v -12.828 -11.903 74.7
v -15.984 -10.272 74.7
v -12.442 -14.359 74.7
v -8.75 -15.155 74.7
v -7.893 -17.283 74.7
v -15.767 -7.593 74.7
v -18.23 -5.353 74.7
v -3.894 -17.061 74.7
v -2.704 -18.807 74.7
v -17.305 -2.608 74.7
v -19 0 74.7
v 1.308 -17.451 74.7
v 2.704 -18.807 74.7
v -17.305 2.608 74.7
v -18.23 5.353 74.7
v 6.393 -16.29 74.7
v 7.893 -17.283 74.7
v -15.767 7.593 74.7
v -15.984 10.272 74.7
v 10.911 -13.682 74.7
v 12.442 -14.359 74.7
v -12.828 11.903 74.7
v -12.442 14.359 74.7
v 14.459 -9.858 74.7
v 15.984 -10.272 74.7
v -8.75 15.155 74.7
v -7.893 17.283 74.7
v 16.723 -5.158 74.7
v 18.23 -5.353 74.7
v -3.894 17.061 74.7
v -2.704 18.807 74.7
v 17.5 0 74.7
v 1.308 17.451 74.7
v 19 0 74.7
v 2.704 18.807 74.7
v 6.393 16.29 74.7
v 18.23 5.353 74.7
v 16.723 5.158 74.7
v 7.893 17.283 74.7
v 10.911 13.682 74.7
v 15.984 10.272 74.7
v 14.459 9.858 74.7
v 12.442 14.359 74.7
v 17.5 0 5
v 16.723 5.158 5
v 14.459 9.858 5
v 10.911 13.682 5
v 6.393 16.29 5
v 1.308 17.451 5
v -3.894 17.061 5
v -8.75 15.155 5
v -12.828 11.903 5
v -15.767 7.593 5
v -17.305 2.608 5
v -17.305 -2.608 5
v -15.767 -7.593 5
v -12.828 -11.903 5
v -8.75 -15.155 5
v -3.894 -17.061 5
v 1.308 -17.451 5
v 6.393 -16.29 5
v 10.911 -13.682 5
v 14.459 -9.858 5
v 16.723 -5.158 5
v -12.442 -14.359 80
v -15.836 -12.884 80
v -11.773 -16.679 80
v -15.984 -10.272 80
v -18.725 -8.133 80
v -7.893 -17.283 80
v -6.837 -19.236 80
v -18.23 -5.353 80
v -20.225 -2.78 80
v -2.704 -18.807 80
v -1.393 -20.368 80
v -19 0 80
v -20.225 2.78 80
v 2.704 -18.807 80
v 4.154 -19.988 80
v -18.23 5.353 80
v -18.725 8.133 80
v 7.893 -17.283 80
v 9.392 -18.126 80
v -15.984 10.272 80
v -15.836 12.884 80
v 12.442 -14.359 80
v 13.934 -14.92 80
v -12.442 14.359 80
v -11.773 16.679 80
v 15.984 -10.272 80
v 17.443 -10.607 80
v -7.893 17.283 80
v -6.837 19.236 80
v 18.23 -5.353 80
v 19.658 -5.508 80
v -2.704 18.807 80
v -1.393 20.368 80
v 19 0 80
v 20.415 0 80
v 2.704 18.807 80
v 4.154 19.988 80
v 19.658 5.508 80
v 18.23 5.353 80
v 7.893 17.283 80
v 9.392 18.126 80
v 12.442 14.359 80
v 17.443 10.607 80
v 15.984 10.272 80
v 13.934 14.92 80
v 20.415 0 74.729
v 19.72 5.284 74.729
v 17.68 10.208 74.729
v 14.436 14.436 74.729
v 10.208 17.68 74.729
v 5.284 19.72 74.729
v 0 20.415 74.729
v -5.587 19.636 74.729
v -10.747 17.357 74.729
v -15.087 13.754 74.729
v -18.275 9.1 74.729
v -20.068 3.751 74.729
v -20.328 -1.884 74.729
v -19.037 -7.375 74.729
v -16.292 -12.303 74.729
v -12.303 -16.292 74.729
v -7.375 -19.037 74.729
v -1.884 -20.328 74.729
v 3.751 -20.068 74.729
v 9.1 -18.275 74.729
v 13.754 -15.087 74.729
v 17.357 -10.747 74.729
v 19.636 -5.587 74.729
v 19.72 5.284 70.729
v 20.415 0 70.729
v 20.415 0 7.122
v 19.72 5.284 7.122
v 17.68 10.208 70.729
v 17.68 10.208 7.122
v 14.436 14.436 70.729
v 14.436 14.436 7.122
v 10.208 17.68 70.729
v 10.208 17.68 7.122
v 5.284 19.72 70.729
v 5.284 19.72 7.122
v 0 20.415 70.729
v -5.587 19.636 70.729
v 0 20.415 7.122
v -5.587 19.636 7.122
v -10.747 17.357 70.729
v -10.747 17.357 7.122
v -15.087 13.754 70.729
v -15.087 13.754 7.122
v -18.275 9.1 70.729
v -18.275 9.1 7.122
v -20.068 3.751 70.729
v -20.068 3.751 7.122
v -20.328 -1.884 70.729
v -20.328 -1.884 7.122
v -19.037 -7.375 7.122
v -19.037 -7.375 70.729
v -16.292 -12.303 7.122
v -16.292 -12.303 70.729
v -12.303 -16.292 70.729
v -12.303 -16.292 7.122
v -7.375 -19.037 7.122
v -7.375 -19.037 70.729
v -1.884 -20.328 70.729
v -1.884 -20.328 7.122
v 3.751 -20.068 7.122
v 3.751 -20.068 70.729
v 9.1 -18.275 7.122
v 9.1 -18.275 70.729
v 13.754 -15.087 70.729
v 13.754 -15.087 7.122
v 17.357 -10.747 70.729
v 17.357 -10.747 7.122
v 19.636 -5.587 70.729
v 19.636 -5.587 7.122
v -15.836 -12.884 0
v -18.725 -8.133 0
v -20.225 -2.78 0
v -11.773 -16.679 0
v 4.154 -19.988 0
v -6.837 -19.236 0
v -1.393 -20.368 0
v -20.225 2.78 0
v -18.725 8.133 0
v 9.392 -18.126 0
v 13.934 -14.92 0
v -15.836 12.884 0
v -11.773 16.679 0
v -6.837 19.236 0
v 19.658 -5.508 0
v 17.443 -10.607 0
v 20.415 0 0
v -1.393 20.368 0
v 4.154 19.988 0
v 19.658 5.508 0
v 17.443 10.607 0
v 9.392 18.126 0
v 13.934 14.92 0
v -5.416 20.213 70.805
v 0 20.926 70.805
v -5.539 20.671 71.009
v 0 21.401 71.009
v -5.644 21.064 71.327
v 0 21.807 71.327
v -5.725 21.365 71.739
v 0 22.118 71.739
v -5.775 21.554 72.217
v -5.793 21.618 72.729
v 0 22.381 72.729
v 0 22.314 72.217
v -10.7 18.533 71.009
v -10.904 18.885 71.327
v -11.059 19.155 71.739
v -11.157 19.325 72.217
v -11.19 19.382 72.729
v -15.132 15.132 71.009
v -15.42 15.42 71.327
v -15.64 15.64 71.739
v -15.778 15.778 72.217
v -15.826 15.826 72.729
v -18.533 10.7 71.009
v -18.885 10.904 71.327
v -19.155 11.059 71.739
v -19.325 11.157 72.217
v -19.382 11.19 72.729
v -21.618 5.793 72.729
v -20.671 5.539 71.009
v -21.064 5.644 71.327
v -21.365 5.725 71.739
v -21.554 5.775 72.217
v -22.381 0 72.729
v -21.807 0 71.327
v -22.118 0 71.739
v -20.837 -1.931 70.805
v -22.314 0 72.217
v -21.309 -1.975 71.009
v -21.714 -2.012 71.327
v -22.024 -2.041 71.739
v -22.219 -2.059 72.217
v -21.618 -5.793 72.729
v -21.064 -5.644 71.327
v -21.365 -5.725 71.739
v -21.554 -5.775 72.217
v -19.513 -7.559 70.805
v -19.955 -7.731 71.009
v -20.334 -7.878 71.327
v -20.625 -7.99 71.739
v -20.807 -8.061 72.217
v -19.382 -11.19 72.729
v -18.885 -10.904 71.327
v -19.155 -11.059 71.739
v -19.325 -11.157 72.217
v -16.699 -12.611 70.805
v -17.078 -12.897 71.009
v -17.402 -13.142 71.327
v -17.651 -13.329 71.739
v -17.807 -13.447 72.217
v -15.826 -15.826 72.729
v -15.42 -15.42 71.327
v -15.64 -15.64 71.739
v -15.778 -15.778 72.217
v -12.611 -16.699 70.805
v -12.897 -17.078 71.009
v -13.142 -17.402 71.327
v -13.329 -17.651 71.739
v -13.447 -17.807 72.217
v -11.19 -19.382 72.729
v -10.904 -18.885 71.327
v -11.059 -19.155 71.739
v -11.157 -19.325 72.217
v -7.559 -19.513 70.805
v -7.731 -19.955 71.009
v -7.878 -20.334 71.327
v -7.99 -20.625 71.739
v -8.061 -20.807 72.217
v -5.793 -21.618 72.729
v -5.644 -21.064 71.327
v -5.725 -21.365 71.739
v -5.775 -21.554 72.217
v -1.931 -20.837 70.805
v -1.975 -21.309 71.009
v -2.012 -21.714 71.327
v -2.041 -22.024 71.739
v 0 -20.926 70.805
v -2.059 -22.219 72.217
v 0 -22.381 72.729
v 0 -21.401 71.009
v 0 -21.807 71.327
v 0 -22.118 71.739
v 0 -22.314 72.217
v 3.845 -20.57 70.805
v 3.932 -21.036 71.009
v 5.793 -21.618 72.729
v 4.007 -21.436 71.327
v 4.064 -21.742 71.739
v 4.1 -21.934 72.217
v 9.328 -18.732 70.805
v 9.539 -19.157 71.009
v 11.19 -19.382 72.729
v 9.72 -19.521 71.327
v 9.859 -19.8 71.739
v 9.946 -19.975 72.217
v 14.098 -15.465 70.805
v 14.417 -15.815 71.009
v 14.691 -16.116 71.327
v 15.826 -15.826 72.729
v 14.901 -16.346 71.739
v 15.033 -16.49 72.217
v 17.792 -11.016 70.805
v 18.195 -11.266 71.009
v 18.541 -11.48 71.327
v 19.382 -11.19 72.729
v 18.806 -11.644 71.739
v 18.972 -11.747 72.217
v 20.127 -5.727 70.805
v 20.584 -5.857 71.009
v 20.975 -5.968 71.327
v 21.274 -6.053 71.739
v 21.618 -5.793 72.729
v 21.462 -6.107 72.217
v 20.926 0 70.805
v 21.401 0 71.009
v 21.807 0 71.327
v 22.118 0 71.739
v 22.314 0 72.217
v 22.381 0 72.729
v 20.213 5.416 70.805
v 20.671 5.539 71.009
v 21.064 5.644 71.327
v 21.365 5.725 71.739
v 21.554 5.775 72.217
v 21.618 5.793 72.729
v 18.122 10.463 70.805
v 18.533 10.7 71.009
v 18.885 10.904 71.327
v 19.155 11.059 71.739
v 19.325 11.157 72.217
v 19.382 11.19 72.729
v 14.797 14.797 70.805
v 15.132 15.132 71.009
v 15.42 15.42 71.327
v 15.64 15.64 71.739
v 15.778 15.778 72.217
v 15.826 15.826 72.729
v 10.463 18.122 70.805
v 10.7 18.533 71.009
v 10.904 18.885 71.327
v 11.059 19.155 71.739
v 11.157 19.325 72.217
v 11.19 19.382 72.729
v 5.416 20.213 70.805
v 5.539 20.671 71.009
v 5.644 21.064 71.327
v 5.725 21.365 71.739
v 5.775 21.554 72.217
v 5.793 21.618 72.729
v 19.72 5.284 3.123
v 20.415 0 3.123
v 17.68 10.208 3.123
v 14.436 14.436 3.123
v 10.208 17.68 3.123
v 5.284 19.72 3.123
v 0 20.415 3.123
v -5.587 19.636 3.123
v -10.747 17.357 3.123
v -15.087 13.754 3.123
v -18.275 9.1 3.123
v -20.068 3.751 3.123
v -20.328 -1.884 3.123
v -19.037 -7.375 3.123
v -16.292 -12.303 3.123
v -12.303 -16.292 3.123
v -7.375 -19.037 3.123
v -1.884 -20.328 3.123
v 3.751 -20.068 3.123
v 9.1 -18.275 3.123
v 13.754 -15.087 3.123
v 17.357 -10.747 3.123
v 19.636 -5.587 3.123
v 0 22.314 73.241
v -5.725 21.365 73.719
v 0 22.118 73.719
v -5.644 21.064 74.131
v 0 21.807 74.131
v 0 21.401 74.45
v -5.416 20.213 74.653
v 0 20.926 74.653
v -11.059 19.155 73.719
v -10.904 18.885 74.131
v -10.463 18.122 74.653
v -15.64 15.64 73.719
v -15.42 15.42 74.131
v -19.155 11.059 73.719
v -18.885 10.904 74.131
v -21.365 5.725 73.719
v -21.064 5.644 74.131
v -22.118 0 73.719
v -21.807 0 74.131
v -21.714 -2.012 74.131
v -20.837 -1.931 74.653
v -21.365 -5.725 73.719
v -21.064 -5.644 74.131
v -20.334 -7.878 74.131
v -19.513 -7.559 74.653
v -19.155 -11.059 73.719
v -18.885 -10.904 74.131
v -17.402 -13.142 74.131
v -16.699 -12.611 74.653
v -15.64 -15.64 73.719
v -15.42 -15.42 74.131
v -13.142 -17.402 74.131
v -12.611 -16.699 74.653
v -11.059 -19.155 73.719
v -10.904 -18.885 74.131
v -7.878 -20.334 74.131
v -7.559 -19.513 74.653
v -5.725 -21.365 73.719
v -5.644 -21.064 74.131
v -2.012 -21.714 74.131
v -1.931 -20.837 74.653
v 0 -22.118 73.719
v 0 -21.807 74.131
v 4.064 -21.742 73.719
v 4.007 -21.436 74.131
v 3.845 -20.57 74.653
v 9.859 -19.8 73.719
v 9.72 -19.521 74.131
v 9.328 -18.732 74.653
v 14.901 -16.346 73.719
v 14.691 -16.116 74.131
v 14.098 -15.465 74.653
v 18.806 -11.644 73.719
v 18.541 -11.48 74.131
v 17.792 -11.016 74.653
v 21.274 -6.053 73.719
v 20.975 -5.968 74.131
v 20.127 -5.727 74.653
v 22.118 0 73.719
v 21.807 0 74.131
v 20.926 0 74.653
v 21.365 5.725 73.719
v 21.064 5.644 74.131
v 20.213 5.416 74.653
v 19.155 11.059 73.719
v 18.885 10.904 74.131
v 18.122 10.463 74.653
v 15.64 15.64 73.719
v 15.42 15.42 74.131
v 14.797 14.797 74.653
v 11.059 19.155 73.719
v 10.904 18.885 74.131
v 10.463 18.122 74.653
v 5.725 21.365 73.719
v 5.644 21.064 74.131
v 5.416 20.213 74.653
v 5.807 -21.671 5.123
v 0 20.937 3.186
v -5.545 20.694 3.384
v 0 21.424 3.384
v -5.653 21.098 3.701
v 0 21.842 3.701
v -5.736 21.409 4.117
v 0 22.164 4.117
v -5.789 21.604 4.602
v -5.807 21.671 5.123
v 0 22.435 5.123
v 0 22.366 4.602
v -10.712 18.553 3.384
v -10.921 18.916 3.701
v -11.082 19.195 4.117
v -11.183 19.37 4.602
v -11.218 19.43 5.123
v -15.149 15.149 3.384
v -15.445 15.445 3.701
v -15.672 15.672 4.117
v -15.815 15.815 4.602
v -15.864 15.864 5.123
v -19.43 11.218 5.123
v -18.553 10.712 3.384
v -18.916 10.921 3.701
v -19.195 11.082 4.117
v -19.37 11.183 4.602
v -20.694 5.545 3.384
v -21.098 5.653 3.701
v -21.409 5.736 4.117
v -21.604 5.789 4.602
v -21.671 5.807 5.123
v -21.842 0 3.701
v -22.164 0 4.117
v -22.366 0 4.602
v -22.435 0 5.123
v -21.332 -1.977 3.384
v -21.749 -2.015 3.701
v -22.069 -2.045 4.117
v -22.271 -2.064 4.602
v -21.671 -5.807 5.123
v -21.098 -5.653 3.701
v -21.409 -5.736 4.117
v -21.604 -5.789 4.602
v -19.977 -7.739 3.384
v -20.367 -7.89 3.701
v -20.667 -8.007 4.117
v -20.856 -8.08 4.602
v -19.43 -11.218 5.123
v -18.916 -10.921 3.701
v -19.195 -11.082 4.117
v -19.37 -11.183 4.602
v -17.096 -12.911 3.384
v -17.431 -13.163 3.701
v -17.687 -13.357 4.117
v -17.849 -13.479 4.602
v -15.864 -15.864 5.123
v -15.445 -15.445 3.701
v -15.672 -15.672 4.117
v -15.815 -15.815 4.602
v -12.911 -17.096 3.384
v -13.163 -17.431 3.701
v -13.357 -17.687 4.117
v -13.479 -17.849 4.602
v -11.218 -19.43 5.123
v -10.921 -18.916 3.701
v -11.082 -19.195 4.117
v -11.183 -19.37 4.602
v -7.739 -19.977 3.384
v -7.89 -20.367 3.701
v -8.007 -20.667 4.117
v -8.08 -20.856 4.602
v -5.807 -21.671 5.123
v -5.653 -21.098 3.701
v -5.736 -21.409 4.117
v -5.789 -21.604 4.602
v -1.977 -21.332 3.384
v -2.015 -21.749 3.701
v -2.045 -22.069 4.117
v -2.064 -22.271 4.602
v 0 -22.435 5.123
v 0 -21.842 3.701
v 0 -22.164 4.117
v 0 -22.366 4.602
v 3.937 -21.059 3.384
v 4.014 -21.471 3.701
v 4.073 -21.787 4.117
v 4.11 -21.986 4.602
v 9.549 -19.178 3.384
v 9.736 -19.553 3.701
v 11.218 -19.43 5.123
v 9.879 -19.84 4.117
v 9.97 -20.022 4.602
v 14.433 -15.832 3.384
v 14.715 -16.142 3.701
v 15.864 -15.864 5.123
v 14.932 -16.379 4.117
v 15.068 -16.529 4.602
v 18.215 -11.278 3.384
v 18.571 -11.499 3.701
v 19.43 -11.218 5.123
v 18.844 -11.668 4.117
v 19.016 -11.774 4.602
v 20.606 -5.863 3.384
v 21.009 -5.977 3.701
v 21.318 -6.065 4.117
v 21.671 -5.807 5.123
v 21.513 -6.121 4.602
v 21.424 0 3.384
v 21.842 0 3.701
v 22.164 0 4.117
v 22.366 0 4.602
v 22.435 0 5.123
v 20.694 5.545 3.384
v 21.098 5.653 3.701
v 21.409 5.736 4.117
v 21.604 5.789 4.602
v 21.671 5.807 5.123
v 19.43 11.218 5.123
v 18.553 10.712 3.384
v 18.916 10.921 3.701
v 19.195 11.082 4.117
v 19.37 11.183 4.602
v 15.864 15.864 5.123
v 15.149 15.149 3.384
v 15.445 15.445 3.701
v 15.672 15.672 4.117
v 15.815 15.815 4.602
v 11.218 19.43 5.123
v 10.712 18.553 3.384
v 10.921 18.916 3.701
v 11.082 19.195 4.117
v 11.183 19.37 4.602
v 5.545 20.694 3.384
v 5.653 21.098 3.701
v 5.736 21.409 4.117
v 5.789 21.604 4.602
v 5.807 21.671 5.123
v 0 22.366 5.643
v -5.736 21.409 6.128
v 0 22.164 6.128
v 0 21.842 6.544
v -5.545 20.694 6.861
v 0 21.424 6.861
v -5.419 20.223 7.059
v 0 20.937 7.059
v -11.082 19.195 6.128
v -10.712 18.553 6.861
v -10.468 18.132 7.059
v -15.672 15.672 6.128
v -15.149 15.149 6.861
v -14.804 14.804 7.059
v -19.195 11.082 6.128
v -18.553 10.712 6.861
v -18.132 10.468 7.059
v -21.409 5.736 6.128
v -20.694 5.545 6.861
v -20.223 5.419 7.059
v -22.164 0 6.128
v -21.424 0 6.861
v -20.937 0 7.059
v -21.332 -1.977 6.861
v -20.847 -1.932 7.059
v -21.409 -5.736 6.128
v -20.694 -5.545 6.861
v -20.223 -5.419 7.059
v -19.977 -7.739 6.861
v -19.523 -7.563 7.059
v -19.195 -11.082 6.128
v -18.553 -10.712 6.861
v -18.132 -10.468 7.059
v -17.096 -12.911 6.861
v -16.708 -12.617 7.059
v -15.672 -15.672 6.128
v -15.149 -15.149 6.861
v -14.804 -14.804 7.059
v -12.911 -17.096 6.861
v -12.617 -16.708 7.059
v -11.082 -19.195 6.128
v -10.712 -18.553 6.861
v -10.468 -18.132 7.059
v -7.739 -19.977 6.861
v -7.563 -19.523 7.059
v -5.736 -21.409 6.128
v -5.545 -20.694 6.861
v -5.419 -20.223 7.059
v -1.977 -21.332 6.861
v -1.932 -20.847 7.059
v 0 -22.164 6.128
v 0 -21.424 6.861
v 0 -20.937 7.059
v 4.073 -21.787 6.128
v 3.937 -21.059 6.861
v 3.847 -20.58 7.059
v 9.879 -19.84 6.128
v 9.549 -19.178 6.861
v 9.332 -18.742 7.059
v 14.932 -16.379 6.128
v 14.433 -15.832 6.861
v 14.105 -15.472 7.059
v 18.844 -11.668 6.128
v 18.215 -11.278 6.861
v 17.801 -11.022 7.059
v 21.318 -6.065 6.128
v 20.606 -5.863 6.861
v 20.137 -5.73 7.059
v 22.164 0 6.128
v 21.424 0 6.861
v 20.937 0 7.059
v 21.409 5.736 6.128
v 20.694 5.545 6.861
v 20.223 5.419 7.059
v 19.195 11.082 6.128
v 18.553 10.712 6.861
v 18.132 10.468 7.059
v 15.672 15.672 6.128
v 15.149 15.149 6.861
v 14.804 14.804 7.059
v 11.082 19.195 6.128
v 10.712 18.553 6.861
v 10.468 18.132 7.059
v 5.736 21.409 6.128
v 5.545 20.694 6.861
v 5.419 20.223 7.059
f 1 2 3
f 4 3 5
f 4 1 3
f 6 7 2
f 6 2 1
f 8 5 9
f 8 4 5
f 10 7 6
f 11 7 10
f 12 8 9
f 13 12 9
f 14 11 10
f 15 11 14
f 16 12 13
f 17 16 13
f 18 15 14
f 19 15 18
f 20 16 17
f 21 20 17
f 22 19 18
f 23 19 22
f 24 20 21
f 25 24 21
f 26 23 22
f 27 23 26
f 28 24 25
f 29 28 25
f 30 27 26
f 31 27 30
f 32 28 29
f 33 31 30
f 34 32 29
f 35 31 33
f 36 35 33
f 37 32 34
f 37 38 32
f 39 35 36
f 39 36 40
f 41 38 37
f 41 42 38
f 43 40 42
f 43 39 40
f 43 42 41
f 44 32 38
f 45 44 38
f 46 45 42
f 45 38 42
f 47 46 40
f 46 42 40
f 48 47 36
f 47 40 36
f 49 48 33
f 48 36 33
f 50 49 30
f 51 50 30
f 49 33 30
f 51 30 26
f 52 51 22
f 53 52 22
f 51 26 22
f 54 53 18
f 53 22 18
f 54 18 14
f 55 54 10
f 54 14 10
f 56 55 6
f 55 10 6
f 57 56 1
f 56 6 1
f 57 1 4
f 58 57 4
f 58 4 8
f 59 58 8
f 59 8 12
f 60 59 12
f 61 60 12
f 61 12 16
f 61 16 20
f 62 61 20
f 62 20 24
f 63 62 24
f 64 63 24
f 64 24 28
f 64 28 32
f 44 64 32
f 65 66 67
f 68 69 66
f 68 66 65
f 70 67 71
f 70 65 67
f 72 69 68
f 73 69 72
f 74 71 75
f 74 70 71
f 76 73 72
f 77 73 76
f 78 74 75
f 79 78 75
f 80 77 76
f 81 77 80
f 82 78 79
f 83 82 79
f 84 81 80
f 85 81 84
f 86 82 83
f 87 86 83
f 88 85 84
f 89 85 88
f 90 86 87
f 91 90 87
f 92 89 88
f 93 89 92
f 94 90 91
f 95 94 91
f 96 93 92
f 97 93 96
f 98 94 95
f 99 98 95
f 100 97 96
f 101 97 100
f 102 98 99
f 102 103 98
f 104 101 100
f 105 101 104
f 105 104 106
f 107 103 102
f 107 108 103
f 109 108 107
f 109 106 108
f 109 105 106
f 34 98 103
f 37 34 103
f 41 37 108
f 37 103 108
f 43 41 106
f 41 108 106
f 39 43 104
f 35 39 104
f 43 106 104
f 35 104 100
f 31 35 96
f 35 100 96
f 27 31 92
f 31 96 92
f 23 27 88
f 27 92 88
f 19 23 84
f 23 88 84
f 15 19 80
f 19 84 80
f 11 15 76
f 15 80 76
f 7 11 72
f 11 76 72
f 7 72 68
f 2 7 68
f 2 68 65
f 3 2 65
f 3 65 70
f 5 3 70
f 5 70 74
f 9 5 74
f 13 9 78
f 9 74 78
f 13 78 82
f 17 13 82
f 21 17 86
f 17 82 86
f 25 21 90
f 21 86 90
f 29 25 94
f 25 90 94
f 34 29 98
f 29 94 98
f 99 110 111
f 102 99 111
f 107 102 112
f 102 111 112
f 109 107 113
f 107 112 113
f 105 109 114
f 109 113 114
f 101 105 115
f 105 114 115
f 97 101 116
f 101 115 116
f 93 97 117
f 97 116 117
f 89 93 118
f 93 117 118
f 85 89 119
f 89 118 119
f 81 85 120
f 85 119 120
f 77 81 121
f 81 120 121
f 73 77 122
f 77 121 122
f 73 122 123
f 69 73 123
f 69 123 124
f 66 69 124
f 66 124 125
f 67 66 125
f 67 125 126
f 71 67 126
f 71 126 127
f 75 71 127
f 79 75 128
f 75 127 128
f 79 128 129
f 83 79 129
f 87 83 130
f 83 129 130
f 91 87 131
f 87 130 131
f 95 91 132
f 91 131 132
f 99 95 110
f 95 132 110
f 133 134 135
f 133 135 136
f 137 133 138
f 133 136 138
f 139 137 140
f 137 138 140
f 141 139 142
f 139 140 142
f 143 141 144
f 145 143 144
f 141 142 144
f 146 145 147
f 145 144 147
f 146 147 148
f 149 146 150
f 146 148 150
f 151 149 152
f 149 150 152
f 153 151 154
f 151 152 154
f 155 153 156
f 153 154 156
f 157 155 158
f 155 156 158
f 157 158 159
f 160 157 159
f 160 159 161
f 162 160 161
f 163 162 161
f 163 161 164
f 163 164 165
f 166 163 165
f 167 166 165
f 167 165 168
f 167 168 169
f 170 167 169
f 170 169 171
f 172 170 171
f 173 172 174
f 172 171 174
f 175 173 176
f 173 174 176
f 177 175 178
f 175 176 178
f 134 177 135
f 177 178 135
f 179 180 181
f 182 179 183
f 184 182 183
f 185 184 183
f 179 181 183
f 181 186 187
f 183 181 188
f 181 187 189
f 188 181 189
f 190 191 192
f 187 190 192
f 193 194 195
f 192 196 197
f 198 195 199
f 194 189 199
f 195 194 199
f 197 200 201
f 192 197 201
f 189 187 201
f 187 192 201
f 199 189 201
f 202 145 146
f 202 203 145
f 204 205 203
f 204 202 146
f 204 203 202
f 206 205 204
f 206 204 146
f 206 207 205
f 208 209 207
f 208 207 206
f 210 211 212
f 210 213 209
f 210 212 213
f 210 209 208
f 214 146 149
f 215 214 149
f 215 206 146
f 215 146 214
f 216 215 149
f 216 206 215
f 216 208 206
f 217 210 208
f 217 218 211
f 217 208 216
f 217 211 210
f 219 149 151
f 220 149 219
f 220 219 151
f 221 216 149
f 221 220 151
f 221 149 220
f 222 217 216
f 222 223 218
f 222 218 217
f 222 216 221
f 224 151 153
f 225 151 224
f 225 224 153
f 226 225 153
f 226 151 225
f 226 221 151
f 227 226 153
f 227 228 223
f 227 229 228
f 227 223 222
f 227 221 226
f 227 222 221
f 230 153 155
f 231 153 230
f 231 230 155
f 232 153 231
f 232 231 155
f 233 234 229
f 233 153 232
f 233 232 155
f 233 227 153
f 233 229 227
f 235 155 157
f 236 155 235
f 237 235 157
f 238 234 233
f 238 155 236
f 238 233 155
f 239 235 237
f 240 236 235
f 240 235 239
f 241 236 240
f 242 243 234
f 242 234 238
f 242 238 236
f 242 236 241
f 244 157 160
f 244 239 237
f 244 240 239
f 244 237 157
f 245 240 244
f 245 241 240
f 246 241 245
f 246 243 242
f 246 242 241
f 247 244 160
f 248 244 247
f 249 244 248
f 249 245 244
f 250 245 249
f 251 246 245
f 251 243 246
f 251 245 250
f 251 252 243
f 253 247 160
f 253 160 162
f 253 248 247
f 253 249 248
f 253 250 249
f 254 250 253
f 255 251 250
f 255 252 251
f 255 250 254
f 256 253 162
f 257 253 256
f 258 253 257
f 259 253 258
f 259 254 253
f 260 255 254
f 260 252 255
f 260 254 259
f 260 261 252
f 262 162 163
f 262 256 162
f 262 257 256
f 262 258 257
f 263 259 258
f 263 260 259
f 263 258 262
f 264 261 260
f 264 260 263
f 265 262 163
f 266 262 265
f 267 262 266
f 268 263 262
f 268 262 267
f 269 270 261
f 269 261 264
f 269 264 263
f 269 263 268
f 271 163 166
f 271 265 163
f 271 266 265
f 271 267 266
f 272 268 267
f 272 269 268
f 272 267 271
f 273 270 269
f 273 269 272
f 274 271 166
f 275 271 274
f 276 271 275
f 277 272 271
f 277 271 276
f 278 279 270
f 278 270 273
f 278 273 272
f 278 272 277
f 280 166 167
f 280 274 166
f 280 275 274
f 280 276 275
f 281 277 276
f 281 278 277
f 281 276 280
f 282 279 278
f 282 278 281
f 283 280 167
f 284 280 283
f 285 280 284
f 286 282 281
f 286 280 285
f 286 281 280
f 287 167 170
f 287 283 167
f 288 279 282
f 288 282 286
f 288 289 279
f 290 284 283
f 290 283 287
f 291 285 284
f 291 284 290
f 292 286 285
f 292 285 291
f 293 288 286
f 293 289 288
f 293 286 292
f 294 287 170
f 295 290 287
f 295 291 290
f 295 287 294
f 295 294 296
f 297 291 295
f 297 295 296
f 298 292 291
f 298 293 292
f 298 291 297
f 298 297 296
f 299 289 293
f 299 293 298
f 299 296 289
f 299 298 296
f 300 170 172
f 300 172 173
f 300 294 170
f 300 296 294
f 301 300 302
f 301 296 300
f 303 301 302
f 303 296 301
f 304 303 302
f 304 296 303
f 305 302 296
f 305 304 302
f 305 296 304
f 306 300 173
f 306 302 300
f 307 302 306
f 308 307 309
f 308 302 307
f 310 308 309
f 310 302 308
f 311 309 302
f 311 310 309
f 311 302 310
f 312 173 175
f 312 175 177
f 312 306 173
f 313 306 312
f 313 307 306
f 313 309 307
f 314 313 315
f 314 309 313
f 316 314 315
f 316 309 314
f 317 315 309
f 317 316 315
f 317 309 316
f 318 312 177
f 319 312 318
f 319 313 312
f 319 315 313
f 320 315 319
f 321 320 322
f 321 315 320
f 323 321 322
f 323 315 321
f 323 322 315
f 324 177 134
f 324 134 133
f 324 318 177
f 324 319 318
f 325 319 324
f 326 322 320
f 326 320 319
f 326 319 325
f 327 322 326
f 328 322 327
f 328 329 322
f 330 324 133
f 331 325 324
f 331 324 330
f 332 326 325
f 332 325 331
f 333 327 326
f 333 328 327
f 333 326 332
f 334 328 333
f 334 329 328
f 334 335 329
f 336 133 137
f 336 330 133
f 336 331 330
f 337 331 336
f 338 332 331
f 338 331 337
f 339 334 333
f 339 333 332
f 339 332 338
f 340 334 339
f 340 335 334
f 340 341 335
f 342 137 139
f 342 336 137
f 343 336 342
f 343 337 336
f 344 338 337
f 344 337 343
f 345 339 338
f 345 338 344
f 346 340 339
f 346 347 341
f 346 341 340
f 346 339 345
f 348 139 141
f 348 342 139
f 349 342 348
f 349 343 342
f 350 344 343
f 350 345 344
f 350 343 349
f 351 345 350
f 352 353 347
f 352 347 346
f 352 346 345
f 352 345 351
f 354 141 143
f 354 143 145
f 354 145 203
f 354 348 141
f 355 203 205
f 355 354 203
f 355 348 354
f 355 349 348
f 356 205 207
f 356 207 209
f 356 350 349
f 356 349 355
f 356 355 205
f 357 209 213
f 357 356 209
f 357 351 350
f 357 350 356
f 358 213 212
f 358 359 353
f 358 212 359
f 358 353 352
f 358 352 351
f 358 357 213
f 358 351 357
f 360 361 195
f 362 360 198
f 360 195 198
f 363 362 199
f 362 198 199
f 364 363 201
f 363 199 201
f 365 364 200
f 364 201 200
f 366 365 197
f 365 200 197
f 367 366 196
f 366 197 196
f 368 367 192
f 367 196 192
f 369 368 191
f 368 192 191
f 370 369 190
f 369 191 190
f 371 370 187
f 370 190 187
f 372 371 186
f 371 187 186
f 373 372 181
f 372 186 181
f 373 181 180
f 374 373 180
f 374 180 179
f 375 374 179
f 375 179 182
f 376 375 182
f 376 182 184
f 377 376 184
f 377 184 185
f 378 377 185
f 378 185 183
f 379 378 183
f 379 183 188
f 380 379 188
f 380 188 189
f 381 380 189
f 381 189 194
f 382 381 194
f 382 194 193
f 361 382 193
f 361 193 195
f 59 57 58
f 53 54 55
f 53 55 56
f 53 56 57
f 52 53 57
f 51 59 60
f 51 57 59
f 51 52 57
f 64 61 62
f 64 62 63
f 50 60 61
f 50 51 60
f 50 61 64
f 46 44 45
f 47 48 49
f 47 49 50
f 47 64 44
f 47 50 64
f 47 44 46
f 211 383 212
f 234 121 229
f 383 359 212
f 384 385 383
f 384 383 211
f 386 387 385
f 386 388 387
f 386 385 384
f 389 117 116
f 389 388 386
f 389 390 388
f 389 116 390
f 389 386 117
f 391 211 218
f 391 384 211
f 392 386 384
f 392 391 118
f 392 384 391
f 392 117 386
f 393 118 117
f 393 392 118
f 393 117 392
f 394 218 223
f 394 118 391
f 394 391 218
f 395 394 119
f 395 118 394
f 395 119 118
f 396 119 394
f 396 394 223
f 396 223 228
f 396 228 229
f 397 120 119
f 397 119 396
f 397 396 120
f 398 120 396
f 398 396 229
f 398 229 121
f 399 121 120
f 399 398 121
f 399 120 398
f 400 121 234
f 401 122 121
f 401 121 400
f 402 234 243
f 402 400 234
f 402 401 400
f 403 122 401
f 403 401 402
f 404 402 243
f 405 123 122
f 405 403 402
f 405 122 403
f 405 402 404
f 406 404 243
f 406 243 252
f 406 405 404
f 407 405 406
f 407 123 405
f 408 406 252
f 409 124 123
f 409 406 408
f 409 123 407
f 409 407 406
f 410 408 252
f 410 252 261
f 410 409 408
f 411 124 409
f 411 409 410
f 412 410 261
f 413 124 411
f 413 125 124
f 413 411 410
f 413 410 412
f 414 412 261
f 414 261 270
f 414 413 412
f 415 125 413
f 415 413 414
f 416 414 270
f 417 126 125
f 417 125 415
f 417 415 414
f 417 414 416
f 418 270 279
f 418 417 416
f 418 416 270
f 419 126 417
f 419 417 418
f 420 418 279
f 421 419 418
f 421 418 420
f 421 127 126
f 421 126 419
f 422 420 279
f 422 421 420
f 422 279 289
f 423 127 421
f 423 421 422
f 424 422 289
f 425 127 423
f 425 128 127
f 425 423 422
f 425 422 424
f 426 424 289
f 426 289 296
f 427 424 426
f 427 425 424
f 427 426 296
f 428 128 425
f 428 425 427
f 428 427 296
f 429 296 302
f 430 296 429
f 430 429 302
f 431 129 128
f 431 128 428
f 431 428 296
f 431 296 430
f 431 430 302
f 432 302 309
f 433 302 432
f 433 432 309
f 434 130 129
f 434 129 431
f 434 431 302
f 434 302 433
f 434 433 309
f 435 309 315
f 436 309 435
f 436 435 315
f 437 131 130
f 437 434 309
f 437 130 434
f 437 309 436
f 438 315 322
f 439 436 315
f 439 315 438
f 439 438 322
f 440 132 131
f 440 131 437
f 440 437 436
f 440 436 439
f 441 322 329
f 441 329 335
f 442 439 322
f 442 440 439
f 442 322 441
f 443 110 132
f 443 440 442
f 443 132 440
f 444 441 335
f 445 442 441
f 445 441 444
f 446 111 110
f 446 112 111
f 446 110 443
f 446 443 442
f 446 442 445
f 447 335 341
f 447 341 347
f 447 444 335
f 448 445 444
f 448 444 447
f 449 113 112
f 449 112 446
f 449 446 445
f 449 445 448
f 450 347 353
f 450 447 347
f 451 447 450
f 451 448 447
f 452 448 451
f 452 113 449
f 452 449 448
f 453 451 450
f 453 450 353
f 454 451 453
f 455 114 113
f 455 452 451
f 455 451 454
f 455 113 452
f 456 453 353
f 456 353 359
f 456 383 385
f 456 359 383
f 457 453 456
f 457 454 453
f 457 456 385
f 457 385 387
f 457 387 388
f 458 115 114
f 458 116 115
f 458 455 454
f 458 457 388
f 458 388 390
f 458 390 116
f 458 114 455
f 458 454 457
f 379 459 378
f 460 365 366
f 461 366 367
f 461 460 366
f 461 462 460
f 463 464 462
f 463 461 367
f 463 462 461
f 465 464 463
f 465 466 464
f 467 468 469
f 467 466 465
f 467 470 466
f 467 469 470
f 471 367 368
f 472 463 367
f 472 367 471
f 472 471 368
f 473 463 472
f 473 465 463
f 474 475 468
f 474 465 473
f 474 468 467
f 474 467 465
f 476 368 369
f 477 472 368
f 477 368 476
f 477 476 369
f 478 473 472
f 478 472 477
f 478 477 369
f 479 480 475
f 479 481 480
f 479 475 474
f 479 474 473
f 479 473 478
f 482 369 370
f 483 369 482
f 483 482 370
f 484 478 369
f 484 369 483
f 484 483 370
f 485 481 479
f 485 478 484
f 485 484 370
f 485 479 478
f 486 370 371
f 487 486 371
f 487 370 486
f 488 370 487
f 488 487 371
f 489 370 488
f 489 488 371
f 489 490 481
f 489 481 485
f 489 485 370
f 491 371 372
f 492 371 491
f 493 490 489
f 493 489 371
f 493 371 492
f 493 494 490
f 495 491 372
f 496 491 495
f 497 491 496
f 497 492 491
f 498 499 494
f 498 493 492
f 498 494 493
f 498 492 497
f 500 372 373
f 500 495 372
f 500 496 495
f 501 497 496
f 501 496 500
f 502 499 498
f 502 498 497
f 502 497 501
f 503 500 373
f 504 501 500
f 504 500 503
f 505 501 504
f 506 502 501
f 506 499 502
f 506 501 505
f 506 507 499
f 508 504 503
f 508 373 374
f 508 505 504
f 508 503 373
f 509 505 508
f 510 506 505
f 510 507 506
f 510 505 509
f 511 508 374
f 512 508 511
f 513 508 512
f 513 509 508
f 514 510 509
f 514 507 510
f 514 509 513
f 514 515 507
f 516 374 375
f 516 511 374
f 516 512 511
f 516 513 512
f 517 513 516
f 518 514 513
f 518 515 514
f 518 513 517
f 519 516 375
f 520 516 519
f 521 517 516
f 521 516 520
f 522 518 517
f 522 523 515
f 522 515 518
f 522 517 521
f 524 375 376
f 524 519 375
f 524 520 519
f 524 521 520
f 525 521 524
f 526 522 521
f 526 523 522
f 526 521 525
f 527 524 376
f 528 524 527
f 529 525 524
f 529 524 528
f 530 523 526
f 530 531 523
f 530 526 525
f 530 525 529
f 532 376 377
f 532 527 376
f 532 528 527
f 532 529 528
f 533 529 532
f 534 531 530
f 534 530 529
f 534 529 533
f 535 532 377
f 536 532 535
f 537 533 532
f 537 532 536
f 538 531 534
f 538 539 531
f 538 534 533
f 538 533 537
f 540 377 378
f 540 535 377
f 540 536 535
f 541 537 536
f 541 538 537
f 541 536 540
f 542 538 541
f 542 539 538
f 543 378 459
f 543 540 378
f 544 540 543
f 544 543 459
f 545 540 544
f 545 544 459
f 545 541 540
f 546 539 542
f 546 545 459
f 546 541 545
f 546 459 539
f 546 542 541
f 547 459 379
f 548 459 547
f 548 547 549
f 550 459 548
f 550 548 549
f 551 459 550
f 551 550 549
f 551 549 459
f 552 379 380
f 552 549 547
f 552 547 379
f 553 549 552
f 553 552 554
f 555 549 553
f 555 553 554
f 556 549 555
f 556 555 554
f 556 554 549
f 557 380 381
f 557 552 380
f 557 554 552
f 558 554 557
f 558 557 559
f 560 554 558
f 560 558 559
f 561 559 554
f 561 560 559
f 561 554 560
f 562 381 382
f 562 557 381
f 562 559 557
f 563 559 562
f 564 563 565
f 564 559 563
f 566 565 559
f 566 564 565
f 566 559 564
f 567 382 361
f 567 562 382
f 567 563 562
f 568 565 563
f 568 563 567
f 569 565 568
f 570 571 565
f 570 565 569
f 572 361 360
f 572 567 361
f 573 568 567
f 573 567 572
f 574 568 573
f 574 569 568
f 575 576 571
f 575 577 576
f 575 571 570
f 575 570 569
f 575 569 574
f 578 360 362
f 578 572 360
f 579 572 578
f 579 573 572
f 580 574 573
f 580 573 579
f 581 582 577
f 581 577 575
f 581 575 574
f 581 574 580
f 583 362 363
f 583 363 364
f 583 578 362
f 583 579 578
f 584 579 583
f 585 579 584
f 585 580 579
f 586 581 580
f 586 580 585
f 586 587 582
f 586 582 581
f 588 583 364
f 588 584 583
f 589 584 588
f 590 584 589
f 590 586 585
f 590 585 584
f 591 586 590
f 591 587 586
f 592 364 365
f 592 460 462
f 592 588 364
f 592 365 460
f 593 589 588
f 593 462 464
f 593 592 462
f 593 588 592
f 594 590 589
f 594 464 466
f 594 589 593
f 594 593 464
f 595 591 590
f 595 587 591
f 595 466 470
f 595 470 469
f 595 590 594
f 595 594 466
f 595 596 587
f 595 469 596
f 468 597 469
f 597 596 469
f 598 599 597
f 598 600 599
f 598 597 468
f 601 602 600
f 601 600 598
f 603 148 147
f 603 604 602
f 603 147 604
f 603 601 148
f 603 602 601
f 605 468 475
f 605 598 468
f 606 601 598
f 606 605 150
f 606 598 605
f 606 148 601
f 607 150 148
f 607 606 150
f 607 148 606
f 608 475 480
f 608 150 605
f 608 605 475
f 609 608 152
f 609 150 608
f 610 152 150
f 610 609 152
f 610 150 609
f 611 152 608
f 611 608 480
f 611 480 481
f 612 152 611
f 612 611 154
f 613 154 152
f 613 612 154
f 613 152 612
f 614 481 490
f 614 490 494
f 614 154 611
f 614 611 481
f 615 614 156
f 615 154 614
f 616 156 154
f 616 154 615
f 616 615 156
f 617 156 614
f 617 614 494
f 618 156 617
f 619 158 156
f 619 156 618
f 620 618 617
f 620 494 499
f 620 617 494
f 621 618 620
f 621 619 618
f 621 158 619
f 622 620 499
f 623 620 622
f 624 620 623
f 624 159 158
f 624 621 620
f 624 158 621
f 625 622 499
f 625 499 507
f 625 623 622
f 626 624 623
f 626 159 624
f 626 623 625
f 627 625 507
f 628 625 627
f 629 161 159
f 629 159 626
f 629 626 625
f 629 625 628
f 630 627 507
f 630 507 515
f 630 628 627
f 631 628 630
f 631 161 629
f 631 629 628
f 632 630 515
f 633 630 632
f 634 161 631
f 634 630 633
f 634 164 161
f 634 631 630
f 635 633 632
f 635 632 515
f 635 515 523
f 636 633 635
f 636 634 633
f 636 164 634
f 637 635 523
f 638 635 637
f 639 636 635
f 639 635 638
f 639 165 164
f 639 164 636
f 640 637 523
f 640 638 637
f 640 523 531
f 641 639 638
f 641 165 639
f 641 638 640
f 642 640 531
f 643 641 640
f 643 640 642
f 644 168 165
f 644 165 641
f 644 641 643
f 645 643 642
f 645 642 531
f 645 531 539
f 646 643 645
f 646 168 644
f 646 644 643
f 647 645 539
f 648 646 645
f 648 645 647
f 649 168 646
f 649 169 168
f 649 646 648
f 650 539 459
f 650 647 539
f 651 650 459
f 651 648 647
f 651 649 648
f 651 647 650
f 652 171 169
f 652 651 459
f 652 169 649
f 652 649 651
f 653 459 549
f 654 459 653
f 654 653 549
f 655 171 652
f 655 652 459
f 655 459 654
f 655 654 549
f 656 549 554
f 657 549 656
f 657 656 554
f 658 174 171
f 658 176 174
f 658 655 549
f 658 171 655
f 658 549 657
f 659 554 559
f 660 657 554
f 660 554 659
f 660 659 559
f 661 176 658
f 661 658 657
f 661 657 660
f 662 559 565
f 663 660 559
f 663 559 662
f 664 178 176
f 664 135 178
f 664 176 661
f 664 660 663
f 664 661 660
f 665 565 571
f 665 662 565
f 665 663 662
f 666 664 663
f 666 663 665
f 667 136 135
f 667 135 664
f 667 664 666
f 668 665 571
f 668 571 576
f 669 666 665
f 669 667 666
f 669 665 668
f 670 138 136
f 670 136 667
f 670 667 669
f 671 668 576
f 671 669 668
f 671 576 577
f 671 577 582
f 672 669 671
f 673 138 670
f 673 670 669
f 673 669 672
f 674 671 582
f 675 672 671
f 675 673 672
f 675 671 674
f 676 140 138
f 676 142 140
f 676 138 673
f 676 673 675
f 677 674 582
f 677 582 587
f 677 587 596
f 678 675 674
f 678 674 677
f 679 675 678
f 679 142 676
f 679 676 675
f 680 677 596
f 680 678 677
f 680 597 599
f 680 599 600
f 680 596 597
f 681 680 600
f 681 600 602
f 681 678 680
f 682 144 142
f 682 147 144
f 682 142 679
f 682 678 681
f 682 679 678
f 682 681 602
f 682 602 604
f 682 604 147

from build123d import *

# Parameters (mm, degrees)
F0_R     = 20.415147
F1_DEPTH = 80
F2_R     = 17.5
F3_DEPTH = 75
F4_R     = 19
F5_DEPTH = 5.3
F6_R     = 2


with BuildPart() as f1:
    # F0 (on Top) → F1 (new body)
    with BuildSketch(Plane.XY):
        Circle(F0_R)
    extrude(amount=F1_DEPTH)

    # F2 (on face) → F3 (cut)
    with BuildSketch(Plane.XY.offset(80)):
        Circle(F2_R)
    extrude(amount=-F3_DEPTH, mode=Mode.SUBTRACT)

    # F4 (on face) → F5 (cut)
    with BuildSketch(Plane.XY.offset(80)):
        Circle(F4_R)
    extrude(amount=-F5_DEPTH, mode=Mode.SUBTRACT)

    # F6 (on Right) → F7 (revolve)
    with BuildSketch(Plane.YZ):
        with Locations((20.380728, 72.729118)):
            Circle(F6_R)
        with Locations((20.435376, 5.122505)):
            Circle(F6_R)
    revolve(axis=Axis((0, 0, 42.480822), (0, 0, 1)))


solid = f1.part
